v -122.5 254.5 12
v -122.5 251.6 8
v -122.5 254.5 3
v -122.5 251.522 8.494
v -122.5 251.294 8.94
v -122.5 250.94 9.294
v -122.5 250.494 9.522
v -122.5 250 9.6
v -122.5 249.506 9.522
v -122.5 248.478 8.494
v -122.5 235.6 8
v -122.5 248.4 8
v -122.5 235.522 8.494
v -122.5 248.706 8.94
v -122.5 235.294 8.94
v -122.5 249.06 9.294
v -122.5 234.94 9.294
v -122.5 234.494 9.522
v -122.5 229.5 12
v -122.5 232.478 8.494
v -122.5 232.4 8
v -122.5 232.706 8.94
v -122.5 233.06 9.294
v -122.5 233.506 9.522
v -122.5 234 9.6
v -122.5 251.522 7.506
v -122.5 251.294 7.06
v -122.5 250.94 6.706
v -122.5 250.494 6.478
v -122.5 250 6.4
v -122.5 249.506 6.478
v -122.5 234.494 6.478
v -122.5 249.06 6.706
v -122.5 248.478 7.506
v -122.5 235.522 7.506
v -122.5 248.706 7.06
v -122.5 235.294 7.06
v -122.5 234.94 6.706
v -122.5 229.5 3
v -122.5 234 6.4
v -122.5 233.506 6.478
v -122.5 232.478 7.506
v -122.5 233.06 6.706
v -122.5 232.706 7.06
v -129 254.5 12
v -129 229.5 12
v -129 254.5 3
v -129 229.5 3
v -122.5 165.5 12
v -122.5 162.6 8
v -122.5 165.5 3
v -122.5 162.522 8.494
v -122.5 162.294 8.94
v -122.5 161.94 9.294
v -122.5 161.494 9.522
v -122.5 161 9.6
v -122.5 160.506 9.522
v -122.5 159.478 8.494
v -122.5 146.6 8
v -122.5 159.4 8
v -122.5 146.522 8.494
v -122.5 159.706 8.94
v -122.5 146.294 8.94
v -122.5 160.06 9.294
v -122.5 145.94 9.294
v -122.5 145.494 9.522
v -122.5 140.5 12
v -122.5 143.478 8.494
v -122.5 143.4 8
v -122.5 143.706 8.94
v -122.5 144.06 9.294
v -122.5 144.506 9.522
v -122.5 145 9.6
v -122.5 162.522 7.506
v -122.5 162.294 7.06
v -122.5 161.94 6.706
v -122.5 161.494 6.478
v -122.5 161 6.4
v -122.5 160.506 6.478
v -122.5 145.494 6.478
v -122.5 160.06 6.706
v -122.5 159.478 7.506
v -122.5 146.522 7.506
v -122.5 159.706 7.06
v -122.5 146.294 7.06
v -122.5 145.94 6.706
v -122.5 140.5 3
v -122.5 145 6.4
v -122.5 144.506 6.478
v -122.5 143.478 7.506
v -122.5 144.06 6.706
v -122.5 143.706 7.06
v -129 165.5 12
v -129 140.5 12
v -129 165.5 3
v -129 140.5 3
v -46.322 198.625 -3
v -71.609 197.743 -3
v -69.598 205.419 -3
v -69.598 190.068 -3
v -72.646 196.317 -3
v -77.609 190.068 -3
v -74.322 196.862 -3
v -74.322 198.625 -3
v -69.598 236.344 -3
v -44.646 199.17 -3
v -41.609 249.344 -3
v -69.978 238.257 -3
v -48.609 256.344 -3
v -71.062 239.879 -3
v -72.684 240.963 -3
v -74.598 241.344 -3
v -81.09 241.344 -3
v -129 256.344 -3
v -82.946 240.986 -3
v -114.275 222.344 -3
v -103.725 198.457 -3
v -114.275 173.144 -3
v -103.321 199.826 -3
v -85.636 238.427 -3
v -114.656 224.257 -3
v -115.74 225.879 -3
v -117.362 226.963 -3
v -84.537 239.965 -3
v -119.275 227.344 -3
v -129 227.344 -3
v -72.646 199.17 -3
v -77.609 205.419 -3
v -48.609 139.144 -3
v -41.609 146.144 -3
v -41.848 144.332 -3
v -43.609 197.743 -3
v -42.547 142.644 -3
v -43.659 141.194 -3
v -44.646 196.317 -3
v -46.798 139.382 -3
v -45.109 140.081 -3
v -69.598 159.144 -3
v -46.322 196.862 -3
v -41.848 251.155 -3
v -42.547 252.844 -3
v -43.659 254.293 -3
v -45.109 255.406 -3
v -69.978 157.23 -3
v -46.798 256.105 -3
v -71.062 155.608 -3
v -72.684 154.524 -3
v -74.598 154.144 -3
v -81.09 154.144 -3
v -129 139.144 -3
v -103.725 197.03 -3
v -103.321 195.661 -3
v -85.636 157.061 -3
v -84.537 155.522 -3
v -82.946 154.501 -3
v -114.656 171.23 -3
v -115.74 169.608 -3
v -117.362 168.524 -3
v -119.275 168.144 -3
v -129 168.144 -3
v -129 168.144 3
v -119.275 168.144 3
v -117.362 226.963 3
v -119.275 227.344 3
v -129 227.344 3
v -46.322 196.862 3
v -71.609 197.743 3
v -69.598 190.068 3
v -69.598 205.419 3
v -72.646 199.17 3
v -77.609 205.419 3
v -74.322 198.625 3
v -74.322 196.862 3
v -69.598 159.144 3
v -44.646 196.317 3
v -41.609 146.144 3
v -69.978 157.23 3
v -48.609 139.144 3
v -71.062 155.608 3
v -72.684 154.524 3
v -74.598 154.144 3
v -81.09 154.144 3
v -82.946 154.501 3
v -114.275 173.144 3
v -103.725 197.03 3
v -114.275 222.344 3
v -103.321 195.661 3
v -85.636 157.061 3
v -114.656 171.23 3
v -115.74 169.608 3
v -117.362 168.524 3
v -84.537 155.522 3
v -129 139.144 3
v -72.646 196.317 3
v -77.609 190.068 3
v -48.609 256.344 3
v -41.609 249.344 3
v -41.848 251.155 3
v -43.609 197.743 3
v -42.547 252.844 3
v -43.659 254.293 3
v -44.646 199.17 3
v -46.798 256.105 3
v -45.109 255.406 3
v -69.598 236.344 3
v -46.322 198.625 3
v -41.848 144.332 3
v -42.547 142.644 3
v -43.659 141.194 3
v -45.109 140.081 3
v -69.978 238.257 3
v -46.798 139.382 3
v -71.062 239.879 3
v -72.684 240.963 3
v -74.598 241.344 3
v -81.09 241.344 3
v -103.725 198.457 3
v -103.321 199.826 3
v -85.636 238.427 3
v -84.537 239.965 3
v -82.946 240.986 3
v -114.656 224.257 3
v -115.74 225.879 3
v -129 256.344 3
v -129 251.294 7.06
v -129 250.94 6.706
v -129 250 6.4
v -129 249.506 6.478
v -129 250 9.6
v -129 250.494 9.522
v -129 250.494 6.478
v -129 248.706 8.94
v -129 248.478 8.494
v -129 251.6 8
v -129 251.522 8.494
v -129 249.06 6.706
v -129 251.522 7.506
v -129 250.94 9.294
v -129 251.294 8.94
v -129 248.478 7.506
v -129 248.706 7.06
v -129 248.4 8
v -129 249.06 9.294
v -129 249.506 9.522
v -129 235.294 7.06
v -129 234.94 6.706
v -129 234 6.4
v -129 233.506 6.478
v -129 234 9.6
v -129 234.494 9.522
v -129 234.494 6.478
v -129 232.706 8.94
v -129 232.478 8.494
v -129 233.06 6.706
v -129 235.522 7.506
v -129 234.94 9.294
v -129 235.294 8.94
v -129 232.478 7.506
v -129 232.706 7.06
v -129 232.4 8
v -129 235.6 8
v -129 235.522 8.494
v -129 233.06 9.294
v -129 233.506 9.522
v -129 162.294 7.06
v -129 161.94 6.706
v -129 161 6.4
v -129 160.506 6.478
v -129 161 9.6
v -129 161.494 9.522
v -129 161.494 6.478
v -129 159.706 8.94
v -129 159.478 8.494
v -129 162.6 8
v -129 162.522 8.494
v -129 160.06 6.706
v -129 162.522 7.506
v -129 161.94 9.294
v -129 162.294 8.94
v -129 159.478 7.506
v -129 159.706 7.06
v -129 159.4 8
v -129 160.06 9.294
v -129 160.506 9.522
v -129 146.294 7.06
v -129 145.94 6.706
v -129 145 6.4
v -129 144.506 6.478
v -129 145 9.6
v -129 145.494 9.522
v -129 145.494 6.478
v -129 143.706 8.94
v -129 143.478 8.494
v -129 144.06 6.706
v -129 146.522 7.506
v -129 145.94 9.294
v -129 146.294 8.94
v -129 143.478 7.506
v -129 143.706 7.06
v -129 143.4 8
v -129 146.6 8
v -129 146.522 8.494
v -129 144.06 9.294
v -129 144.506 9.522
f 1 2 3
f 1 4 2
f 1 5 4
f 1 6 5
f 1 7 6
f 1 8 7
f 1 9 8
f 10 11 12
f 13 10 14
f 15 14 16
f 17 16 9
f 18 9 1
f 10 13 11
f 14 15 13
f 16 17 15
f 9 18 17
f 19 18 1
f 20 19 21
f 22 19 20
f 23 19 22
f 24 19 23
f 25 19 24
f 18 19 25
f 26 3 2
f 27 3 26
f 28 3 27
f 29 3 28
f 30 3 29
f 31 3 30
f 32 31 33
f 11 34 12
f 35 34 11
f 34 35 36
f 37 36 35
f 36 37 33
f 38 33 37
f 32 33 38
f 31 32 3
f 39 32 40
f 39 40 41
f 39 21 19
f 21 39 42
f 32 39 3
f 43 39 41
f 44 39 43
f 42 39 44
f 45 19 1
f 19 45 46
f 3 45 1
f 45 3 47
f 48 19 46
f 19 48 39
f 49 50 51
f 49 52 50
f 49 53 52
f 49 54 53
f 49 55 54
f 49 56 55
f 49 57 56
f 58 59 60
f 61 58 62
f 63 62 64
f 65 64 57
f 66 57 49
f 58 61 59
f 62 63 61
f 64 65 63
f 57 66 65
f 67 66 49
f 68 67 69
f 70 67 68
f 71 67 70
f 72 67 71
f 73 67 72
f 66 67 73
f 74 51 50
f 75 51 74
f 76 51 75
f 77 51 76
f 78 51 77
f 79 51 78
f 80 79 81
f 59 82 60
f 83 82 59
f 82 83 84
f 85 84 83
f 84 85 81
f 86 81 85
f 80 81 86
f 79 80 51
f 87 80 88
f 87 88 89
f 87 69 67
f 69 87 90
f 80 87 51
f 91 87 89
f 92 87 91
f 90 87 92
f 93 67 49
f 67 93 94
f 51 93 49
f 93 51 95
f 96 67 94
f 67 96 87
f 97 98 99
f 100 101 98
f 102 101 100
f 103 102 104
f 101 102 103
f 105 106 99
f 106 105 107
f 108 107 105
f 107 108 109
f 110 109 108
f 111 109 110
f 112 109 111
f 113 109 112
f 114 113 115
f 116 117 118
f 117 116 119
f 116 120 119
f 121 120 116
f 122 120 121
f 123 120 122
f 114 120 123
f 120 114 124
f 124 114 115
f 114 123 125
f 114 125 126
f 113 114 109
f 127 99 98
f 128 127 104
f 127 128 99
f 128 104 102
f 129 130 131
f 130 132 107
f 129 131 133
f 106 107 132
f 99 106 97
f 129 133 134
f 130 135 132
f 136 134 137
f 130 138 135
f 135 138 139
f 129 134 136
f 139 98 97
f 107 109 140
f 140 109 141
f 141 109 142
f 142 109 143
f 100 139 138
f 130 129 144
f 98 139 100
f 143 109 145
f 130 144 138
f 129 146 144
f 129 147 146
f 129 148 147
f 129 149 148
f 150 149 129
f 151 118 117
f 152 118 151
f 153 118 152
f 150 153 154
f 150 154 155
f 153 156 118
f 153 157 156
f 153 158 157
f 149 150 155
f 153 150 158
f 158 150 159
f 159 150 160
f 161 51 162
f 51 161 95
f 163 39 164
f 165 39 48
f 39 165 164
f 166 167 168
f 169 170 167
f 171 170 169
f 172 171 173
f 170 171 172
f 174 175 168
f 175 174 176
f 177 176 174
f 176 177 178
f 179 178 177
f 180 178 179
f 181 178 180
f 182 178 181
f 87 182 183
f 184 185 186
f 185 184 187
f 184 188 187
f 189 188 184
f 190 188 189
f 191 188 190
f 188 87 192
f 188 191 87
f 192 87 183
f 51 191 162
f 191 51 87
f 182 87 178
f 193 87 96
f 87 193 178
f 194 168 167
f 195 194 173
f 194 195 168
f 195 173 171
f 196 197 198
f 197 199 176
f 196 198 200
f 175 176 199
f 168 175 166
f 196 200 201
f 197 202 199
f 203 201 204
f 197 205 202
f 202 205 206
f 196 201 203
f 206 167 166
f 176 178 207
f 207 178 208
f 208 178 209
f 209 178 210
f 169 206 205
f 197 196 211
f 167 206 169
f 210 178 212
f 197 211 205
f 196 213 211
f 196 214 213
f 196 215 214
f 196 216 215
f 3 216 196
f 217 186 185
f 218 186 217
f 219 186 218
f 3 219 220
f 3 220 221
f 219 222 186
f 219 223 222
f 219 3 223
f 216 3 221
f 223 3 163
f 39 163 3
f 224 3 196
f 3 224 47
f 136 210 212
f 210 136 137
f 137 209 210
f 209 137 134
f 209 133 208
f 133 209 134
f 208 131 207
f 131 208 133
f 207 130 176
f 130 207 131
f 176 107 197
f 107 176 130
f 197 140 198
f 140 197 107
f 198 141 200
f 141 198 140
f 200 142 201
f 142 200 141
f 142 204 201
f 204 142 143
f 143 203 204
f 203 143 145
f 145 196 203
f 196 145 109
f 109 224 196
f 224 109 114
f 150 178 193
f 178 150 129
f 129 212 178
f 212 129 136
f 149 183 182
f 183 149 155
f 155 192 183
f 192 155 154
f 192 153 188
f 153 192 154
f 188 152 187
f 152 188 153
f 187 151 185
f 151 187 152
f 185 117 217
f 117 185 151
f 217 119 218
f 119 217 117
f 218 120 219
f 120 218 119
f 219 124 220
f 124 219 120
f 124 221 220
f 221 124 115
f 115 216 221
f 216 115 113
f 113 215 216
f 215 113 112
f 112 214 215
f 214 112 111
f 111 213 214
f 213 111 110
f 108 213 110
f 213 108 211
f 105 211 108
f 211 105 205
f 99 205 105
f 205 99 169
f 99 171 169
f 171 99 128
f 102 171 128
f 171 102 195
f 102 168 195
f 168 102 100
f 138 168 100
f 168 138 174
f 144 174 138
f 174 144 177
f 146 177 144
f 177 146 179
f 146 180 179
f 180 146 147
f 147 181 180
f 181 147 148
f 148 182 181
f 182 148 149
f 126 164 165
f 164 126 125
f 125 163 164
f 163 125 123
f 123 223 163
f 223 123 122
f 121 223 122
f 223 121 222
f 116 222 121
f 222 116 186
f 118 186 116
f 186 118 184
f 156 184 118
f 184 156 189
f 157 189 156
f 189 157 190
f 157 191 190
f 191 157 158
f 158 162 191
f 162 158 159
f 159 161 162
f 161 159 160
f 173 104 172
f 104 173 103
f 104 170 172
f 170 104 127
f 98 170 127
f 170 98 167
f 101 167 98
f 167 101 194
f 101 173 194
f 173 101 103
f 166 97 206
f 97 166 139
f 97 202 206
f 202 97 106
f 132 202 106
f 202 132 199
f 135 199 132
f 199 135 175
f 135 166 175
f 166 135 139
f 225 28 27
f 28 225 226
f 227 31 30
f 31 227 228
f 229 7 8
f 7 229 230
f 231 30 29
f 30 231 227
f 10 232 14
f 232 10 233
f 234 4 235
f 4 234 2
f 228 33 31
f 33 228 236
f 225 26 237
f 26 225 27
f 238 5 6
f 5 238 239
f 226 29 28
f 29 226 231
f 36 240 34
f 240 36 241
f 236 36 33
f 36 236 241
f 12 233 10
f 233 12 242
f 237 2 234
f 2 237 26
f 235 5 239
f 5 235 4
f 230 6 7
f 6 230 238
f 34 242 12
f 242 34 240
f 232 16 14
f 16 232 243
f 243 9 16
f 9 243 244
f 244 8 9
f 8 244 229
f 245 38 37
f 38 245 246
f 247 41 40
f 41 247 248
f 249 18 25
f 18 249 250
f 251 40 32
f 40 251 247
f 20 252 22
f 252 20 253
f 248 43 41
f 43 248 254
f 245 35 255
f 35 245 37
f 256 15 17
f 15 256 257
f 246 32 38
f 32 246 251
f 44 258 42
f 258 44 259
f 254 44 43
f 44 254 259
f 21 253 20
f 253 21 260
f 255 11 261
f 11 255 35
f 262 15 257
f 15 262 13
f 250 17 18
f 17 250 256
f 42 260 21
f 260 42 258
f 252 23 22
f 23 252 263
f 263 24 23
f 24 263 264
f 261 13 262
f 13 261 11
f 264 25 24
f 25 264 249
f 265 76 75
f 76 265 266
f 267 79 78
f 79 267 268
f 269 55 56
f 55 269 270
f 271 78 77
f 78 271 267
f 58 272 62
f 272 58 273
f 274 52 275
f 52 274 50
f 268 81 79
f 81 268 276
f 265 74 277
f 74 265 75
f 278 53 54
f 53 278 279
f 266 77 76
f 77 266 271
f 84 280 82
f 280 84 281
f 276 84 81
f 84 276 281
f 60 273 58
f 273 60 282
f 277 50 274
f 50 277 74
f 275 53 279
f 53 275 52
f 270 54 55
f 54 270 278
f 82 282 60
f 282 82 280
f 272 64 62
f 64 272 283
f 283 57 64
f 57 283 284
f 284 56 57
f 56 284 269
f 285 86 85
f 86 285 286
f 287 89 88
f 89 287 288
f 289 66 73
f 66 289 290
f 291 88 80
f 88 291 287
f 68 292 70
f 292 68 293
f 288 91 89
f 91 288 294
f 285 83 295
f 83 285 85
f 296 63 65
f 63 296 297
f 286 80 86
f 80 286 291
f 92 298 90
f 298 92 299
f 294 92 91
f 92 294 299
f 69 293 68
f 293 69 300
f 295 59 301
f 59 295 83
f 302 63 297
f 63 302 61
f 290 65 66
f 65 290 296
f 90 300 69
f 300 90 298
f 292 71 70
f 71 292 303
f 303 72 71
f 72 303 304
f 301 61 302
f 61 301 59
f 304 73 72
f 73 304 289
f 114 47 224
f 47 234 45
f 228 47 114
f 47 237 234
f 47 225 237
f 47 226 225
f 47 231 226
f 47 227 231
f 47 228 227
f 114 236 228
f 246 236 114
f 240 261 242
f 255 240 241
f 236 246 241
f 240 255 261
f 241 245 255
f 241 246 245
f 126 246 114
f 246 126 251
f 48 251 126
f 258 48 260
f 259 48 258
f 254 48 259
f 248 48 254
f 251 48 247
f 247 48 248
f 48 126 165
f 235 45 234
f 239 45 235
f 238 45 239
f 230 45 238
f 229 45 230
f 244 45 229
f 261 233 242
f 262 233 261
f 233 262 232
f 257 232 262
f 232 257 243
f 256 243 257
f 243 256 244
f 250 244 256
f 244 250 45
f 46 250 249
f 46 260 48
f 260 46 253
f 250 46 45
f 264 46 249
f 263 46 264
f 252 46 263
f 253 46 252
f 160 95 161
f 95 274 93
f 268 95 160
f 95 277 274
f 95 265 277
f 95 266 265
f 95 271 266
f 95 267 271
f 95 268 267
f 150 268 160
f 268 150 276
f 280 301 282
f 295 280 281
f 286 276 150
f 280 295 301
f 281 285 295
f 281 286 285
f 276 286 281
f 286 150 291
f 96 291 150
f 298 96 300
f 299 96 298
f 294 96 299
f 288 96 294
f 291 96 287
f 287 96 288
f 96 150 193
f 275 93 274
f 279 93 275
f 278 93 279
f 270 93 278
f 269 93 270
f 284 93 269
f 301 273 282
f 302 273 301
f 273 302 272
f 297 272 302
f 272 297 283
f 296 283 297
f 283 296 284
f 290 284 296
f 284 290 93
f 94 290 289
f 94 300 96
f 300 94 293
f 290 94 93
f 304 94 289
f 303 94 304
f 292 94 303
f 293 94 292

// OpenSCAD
// Print one with the top difference commented out; one
// with the intersection() commented out.


difference()
//intersection()
{
difference()
{
union()
{
translate([-130,242,7])cube([15, 25, 10],center= true);
translate([-130,153,7])cube([15, 25, 10],center= true);
linear_extrude(file = "../dxf/Y-frog.DXF", layer = "0",
  height = 6, center = true, convexity = 10);
}

translate([-130,242+8,8])
rotate([0,90,0])
cylinder(h=50, r= 1.6, center=true, $fn=20);
translate([-130,242-8,8])
rotate([0,90,0])
cylinder(h=50, r= 1.6, center=true, $fn=20);
translate([-130,153+8,8])
rotate([0,90,0])
cylinder(h=50, r= 1.6, center=true, $fn=20);
translate([-130,153-8,8])
rotate([0,90,0])
cylinder(h=50, r= 1.6, center=true, $fn=20);


}
translate([-204,200,0])cube([150, 150, 30],center= true);
}
